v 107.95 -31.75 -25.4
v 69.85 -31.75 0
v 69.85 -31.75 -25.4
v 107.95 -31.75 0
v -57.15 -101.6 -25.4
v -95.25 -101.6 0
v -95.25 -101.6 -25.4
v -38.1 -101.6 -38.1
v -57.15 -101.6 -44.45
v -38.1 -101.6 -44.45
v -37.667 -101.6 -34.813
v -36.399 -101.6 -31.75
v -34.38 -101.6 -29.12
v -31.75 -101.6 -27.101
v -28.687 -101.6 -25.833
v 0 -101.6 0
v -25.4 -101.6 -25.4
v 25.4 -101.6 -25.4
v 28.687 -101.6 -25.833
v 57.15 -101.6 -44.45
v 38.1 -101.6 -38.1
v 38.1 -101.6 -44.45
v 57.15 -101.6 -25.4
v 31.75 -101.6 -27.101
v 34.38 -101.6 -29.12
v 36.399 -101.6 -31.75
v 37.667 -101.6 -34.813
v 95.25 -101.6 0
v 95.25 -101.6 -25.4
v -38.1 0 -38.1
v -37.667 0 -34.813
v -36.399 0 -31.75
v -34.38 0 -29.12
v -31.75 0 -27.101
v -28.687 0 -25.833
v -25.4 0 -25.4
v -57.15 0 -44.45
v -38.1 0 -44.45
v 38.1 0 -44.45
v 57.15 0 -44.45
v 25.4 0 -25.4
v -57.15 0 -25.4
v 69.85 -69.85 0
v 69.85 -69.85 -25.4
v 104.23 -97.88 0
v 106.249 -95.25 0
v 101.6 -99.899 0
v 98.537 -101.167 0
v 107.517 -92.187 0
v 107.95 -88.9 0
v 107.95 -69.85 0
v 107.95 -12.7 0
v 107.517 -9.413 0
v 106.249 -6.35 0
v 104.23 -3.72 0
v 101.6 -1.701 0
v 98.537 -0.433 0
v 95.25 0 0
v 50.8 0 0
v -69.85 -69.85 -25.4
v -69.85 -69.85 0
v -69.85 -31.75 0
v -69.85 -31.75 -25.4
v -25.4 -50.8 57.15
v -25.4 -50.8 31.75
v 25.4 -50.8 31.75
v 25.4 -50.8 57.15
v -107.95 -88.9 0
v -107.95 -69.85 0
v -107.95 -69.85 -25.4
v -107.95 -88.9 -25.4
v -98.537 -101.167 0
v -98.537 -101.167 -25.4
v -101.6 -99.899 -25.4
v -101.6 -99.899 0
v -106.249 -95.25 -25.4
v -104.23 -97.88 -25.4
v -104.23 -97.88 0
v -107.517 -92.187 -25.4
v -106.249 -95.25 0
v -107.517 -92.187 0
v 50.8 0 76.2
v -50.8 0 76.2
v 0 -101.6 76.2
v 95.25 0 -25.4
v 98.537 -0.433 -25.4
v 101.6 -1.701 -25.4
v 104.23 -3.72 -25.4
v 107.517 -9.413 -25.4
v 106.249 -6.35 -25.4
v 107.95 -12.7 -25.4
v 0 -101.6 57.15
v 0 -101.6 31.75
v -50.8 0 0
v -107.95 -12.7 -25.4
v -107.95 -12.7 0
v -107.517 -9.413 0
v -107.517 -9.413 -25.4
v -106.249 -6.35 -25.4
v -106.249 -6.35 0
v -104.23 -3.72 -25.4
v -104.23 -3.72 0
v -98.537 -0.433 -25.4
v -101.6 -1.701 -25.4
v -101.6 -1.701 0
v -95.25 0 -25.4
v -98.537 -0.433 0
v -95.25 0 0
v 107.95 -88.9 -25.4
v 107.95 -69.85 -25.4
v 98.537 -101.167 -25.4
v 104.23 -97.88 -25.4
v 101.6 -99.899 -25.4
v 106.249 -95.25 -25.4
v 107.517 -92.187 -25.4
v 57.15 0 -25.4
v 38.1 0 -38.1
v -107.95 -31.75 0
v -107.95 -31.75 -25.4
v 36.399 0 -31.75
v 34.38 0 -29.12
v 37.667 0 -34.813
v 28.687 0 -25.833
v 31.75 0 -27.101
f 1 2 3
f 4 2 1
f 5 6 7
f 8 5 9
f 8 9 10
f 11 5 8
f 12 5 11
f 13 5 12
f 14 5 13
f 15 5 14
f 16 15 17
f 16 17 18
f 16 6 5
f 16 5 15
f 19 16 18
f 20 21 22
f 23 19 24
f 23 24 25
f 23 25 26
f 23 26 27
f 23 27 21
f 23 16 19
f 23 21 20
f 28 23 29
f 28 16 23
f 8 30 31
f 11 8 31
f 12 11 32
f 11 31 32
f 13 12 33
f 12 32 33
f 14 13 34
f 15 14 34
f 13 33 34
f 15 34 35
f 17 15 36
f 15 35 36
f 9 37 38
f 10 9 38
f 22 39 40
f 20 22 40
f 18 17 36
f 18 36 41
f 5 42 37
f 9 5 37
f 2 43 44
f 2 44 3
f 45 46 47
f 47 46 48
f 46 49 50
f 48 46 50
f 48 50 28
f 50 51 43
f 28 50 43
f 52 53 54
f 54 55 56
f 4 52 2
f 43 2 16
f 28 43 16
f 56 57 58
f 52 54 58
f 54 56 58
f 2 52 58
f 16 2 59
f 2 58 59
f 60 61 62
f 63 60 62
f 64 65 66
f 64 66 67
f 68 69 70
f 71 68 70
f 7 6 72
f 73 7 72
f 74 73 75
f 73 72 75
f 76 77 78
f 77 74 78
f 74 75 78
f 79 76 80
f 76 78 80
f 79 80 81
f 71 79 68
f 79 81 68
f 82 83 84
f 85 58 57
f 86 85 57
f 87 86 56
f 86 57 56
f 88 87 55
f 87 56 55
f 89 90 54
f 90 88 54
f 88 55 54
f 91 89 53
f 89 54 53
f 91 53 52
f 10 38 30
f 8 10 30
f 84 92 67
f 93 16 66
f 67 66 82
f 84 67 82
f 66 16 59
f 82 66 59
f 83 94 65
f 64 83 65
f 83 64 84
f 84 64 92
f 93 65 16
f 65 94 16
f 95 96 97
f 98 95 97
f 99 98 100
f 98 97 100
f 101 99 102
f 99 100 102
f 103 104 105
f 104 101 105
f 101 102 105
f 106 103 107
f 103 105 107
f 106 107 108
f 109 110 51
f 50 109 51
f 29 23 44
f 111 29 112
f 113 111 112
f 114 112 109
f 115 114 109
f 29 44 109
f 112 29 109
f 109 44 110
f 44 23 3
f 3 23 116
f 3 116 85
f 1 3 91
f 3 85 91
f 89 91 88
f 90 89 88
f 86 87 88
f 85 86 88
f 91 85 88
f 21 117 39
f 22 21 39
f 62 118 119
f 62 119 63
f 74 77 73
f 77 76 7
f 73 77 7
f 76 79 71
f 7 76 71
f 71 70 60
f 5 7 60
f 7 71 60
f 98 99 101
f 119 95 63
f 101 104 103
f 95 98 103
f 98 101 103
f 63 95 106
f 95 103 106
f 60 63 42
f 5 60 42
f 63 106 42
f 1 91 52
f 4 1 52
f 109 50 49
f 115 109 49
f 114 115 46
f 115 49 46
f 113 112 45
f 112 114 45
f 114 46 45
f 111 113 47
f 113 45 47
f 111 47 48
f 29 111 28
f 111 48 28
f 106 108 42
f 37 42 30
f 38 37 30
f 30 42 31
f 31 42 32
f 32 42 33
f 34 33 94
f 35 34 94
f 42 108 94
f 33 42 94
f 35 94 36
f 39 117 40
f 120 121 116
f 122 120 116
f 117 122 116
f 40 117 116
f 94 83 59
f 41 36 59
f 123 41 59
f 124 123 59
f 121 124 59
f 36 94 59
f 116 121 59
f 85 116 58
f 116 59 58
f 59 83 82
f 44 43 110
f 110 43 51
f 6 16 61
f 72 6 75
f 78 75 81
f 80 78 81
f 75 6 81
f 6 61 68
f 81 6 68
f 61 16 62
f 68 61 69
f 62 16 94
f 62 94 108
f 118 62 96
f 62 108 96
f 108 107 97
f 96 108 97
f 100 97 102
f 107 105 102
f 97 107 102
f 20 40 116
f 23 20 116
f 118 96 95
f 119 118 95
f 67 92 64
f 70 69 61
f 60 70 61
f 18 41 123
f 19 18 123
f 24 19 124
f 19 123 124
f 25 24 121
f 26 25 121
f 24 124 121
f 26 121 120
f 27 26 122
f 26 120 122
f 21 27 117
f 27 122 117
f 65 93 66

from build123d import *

# Parameters (mm, degrees)
F1_DEPTH      = 101.6
F2_W          = 38.1
F2_H          = 38.1
F3_DEPTH      = 44.451
F5_DEPTH      = 76.2
F6_W          = 50.8
F6_H          = 25.4
F7_DEPTH      = 107.951
F7_DEPTH_BACK = 107.951


with BuildPart() as f1:
    # F0 (on Front) → F1 (new body)
    with BuildSketch(Plane.XZ):
        with BuildLine():
            Line((107.95, 0), (-107.95, 0))
            Line((-107.95, 0), (-107.95, -25.4))
            Line((-107.95, -25.4), (-57.15, -25.4))
            Line((-57.15, -25.4), (-57.15, -44.45))
            Line((-57.15, -44.45), (-38.1, -44.45))
            Line((-38.1, -44.45), (-38.1, -38.1))
            ThreePointArc((-38.1, -38.1), (-34.3802561211, -29.1197438789), (-25.4, -25.4))
            Line((-25.4, -25.4), (25.4, -25.4))
            ThreePointArc((25.4, -25.4), (34.3802561211, -29.1197438789), (38.1, -38.1))
            Line((38.1, -38.1), (38.1, -44.45))
            Line((38.1, -44.45), (57.15, -44.45))
            Line((57.15, -44.45), (57.15, -25.4))
            Line((57.15, -25.4), (107.95, -25.4))
            Line((107.95, -25.4), (107.95, 0))
        make_face()
    extrude(amount=F1_DEPTH)

    # F2 (on face) → F3 (cut, through all)
    with BuildSketch(Plane.XY):
        with BuildLine():
            ThreePointArc((-107.95, -12.7), (-104.2302561211, -3.7197438789), (-95.25, 0))
            Line((-95.25, 0), (-107.95, 0))
            Line((-107.95, 0), (-107.95, -12.7))
        make_face()
        with BuildLine():
            ThreePointArc((-95.25, -101.6), (-104.2302561211, -97.8802561211), (-107.95, -88.9))
            Line((-107.95, -88.9), (-107.95, -101.6))
            Line((-107.95, -101.6), (-95.25, -101.6))
        make_face()
        with BuildLine():
            ThreePointArc((107.95, -88.9), (104.2302561211, -97.8802561211), (95.25, -101.6))
            Line((95.25, -101.6), (107.95, -101.6))
            Line((107.95, -101.6), (107.95, -88.9))
        make_face()
        with BuildLine():
            ThreePointArc((95.25, 0), (104.2302561211, -3.7197438789), (107.95, -12.7))
            Line((107.95, -12.7), (107.95, 0))
            Line((107.95, 0), (95.25, 0))
        make_face()
        with Locations((-88.9, -50.8)):
            Rectangle(F2_W, F2_H)
        with Locations((88.9, -50.8)):
            Rectangle(F2_W, F2_H)
    extrude(amount=-F3_DEPTH, mode=Mode.SUBTRACT)

    # F4 (on face) → F5 (join)
    with BuildSketch(Plane.XY):
        Polygon((-50.8, 0), (0, -101.6), (50.8, 0), align=None)
    extrude(amount=F5_DEPTH)

    # F6 (on Right) → F7 (cut, two sides)
    with BuildSketch(Plane.YZ) as f7_sk:
        with Locations((-76.2, 44.45)):
            Rectangle(F6_W, F6_H)
    extrude(amount=-F7_DEPTH, mode=Mode.SUBTRACT)
    extrude(f7_sk.sketch, amount=F7_DEPTH_BACK, mode=Mode.SUBTRACT)


solid = f1.part
